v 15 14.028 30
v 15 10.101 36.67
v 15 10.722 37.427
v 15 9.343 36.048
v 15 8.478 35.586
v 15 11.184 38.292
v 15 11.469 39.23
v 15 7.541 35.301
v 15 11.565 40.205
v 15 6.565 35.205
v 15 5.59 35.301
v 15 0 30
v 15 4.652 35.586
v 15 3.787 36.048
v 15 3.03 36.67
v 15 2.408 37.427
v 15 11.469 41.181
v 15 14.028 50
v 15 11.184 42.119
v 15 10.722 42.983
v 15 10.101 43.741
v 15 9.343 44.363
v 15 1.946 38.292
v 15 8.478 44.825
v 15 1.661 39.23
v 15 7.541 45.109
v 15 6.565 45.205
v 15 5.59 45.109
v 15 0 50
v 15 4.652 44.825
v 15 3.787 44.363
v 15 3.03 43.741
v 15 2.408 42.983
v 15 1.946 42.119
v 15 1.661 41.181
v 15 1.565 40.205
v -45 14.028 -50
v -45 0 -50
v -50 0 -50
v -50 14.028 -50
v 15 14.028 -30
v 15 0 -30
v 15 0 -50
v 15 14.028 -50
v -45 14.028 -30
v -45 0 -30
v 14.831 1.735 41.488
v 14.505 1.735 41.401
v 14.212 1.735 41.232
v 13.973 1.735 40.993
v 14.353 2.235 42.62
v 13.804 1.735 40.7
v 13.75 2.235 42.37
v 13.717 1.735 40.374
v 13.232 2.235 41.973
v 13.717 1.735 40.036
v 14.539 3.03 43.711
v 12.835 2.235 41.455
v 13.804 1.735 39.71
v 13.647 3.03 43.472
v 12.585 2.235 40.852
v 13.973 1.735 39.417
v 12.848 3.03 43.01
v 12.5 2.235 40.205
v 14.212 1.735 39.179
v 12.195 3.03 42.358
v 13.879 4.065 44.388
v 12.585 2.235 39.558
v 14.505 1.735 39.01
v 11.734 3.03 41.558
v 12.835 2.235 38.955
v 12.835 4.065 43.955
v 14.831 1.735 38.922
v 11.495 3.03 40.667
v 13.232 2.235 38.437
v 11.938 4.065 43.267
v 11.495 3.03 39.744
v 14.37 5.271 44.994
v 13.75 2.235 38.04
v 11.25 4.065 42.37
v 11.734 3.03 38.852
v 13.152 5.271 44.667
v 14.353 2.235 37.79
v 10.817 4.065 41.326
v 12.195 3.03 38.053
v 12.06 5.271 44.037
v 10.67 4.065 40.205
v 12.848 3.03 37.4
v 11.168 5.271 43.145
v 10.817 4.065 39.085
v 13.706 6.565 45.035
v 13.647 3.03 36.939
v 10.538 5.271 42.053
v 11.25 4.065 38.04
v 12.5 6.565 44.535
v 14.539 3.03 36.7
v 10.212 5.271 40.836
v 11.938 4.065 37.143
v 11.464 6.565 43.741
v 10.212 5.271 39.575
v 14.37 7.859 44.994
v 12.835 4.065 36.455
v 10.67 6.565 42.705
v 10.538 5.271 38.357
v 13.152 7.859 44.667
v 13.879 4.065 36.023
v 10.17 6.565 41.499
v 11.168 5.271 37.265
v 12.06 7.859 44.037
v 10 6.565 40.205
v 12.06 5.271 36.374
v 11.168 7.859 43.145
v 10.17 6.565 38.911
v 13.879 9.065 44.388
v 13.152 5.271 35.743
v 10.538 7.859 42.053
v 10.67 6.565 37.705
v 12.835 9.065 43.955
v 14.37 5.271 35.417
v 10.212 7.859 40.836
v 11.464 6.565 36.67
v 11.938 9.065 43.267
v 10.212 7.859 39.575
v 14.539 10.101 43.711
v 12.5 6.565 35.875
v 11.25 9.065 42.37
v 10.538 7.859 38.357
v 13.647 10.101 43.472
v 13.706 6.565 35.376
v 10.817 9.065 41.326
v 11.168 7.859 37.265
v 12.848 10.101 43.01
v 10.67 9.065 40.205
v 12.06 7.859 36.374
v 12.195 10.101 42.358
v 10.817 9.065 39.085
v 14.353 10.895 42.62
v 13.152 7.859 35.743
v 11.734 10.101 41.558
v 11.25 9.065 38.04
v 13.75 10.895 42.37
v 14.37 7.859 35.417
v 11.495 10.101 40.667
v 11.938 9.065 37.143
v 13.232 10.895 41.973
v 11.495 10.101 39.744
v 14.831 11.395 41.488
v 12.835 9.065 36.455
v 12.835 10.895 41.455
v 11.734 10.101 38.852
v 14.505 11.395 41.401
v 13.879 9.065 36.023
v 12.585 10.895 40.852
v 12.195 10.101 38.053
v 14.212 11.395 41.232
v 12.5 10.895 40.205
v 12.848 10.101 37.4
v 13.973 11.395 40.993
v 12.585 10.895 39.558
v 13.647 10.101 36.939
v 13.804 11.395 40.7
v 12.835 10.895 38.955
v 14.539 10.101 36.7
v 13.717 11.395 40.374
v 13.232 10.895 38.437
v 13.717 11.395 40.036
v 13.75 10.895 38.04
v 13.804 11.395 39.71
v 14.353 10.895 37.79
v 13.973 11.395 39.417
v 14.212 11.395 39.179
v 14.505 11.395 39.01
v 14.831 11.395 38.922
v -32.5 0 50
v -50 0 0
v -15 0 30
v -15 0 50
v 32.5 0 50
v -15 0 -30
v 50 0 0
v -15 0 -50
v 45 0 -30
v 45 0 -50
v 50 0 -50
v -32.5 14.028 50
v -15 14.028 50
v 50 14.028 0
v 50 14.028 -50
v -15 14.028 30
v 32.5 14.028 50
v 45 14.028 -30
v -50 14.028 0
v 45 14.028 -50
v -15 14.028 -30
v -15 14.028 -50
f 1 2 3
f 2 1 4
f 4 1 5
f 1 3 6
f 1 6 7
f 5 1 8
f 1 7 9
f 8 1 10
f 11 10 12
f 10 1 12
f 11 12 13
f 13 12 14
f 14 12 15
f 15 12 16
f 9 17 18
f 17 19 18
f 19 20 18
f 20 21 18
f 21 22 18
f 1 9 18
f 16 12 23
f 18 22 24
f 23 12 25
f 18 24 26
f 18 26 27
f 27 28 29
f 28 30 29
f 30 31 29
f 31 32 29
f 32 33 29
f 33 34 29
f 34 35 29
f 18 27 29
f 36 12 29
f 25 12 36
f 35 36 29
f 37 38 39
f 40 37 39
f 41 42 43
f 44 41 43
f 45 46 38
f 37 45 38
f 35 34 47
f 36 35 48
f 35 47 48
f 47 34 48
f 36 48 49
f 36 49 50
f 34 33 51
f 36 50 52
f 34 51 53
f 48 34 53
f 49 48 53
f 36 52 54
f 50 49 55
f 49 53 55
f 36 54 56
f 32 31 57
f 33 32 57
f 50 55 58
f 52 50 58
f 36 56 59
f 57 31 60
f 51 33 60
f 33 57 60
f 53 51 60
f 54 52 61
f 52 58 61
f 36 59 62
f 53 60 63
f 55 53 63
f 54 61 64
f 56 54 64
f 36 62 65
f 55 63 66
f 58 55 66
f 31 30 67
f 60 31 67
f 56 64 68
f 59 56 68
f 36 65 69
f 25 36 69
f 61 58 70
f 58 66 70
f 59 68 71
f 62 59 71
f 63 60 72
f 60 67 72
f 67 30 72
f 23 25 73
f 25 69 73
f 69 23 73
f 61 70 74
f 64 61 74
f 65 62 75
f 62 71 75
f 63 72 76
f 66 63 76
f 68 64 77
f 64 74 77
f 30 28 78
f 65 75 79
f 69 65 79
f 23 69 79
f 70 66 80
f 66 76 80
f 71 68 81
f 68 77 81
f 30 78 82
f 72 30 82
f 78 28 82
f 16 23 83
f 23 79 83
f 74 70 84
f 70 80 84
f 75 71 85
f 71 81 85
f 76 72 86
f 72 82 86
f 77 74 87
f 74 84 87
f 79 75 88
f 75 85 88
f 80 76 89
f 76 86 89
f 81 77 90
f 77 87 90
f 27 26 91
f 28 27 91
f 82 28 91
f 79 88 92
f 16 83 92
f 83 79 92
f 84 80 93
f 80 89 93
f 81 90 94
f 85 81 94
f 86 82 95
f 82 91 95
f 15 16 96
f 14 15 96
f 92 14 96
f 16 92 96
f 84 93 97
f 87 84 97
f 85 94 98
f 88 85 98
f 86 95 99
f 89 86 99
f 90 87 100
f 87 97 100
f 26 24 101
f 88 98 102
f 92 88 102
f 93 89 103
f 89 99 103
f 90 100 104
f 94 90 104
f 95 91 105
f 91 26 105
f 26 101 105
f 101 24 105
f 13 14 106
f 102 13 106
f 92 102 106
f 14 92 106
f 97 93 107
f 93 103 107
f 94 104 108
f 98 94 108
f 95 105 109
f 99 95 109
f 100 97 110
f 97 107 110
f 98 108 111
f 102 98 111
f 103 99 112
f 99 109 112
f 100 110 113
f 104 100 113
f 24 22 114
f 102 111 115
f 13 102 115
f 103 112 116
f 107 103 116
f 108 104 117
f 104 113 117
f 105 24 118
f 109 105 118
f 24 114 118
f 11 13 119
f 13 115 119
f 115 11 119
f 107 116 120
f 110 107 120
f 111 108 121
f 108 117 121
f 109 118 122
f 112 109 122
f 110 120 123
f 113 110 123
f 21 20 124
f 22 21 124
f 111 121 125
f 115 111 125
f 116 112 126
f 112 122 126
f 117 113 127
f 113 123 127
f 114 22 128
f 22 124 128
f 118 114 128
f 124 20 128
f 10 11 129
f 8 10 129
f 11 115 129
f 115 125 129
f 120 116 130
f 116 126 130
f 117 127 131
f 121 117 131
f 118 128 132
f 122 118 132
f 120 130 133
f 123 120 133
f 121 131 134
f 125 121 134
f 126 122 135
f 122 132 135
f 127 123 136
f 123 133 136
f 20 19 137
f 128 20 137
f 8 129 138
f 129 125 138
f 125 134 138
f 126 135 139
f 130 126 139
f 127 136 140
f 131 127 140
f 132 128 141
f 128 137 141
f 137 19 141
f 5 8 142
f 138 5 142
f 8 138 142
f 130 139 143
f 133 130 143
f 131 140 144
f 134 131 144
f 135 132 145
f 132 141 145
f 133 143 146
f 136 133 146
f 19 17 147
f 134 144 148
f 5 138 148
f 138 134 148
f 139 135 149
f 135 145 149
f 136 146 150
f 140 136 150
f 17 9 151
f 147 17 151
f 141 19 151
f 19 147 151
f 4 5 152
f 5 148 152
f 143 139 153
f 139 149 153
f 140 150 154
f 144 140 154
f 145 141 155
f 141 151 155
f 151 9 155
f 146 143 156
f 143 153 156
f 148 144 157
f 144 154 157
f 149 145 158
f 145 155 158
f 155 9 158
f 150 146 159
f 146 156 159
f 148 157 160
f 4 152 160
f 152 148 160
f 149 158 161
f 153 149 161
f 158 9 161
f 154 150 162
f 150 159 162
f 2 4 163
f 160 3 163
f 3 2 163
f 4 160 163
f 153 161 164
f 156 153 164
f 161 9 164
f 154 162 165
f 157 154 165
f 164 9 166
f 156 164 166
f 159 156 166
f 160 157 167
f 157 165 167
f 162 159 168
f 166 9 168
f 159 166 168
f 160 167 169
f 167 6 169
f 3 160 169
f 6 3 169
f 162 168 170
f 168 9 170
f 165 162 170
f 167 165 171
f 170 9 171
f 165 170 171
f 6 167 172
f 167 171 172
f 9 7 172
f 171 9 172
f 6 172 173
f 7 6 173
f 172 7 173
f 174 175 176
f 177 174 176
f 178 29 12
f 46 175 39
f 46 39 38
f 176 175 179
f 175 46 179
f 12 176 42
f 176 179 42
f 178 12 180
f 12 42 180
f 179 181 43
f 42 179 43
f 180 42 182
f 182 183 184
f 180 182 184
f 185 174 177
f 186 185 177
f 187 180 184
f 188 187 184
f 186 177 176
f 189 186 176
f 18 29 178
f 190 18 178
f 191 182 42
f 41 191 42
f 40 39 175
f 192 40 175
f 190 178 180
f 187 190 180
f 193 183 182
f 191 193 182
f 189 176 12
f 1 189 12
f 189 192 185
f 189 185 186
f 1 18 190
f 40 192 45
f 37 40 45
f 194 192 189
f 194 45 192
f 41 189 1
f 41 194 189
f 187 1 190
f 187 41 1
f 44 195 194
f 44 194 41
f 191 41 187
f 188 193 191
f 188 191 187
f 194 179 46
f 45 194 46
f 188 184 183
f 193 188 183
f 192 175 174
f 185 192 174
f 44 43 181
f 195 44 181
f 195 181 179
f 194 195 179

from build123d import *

# Parameters (mm, degrees)
BOSS_EXTRUDE1_DEPTH = 14.027771651
CUT_EXTRUDE1_DEPTH  = 16
CUT_EXTRUDE2_DEPTH  = 16


with BuildPart() as part:
    # Sketch1 → Boss-Extrude1 (new body)
    with BuildSketch(Plane(origin=(0, 0, 0), x_dir=(1, 0, 0), z_dir=(0, 1, 0))):
        Polygon((-45, 50), (-50, 50), (-50, -50), (-15, -50), (-15, -30), (15, -30), (15, -50), (50, -50), (50, 50), (45, 50), (45, 30), (15, 30), (15, 50), (-15, 50), (-15, 30), (-45, 30), align=None)
    extrude(amount=BOSS_EXTRUDE1_DEPTH)

    # Sketch2 → Revolve1 (revolve)
    with BuildSketch(Plane.ZY.offset(-15)):
        with BuildLine():
            Line((40.205231865, 11.565079329), (40.205231865, 1.565079329))
            ThreePointArc((40.205231865, 1.565079329), (35.205231865, 6.565079329), (40.205231865, 11.565079329))
        make_face()
    revolve(axis=Axis((15, 11.565079329, 40.205231865), (0, -1, 0)))

    # Sketch3 → Cut-Extrude1 (cut)
    with BuildSketch(Plane(origin=(0, 0, 0), x_dir=(1, 0, 0), z_dir=(0, 1, 0))):
        Polygon((-50, 0), (-32.5, -50), (-50, -50), align=None)
    extrude(amount=CUT_EXTRUDE1_DEPTH, mode=Mode.SUBTRACT)

    # Sketch4 → Cut-Extrude2 (cut)
    with BuildSketch(Plane(origin=(0, 0, 0), x_dir=(1, 0, 0), z_dir=(0, 1, 0))):
        Polygon((32.5, -50), (50, 0), (50, -50), align=None)
    extrude(amount=CUT_EXTRUDE2_DEPTH, mode=Mode.SUBTRACT)


solid = part.part
